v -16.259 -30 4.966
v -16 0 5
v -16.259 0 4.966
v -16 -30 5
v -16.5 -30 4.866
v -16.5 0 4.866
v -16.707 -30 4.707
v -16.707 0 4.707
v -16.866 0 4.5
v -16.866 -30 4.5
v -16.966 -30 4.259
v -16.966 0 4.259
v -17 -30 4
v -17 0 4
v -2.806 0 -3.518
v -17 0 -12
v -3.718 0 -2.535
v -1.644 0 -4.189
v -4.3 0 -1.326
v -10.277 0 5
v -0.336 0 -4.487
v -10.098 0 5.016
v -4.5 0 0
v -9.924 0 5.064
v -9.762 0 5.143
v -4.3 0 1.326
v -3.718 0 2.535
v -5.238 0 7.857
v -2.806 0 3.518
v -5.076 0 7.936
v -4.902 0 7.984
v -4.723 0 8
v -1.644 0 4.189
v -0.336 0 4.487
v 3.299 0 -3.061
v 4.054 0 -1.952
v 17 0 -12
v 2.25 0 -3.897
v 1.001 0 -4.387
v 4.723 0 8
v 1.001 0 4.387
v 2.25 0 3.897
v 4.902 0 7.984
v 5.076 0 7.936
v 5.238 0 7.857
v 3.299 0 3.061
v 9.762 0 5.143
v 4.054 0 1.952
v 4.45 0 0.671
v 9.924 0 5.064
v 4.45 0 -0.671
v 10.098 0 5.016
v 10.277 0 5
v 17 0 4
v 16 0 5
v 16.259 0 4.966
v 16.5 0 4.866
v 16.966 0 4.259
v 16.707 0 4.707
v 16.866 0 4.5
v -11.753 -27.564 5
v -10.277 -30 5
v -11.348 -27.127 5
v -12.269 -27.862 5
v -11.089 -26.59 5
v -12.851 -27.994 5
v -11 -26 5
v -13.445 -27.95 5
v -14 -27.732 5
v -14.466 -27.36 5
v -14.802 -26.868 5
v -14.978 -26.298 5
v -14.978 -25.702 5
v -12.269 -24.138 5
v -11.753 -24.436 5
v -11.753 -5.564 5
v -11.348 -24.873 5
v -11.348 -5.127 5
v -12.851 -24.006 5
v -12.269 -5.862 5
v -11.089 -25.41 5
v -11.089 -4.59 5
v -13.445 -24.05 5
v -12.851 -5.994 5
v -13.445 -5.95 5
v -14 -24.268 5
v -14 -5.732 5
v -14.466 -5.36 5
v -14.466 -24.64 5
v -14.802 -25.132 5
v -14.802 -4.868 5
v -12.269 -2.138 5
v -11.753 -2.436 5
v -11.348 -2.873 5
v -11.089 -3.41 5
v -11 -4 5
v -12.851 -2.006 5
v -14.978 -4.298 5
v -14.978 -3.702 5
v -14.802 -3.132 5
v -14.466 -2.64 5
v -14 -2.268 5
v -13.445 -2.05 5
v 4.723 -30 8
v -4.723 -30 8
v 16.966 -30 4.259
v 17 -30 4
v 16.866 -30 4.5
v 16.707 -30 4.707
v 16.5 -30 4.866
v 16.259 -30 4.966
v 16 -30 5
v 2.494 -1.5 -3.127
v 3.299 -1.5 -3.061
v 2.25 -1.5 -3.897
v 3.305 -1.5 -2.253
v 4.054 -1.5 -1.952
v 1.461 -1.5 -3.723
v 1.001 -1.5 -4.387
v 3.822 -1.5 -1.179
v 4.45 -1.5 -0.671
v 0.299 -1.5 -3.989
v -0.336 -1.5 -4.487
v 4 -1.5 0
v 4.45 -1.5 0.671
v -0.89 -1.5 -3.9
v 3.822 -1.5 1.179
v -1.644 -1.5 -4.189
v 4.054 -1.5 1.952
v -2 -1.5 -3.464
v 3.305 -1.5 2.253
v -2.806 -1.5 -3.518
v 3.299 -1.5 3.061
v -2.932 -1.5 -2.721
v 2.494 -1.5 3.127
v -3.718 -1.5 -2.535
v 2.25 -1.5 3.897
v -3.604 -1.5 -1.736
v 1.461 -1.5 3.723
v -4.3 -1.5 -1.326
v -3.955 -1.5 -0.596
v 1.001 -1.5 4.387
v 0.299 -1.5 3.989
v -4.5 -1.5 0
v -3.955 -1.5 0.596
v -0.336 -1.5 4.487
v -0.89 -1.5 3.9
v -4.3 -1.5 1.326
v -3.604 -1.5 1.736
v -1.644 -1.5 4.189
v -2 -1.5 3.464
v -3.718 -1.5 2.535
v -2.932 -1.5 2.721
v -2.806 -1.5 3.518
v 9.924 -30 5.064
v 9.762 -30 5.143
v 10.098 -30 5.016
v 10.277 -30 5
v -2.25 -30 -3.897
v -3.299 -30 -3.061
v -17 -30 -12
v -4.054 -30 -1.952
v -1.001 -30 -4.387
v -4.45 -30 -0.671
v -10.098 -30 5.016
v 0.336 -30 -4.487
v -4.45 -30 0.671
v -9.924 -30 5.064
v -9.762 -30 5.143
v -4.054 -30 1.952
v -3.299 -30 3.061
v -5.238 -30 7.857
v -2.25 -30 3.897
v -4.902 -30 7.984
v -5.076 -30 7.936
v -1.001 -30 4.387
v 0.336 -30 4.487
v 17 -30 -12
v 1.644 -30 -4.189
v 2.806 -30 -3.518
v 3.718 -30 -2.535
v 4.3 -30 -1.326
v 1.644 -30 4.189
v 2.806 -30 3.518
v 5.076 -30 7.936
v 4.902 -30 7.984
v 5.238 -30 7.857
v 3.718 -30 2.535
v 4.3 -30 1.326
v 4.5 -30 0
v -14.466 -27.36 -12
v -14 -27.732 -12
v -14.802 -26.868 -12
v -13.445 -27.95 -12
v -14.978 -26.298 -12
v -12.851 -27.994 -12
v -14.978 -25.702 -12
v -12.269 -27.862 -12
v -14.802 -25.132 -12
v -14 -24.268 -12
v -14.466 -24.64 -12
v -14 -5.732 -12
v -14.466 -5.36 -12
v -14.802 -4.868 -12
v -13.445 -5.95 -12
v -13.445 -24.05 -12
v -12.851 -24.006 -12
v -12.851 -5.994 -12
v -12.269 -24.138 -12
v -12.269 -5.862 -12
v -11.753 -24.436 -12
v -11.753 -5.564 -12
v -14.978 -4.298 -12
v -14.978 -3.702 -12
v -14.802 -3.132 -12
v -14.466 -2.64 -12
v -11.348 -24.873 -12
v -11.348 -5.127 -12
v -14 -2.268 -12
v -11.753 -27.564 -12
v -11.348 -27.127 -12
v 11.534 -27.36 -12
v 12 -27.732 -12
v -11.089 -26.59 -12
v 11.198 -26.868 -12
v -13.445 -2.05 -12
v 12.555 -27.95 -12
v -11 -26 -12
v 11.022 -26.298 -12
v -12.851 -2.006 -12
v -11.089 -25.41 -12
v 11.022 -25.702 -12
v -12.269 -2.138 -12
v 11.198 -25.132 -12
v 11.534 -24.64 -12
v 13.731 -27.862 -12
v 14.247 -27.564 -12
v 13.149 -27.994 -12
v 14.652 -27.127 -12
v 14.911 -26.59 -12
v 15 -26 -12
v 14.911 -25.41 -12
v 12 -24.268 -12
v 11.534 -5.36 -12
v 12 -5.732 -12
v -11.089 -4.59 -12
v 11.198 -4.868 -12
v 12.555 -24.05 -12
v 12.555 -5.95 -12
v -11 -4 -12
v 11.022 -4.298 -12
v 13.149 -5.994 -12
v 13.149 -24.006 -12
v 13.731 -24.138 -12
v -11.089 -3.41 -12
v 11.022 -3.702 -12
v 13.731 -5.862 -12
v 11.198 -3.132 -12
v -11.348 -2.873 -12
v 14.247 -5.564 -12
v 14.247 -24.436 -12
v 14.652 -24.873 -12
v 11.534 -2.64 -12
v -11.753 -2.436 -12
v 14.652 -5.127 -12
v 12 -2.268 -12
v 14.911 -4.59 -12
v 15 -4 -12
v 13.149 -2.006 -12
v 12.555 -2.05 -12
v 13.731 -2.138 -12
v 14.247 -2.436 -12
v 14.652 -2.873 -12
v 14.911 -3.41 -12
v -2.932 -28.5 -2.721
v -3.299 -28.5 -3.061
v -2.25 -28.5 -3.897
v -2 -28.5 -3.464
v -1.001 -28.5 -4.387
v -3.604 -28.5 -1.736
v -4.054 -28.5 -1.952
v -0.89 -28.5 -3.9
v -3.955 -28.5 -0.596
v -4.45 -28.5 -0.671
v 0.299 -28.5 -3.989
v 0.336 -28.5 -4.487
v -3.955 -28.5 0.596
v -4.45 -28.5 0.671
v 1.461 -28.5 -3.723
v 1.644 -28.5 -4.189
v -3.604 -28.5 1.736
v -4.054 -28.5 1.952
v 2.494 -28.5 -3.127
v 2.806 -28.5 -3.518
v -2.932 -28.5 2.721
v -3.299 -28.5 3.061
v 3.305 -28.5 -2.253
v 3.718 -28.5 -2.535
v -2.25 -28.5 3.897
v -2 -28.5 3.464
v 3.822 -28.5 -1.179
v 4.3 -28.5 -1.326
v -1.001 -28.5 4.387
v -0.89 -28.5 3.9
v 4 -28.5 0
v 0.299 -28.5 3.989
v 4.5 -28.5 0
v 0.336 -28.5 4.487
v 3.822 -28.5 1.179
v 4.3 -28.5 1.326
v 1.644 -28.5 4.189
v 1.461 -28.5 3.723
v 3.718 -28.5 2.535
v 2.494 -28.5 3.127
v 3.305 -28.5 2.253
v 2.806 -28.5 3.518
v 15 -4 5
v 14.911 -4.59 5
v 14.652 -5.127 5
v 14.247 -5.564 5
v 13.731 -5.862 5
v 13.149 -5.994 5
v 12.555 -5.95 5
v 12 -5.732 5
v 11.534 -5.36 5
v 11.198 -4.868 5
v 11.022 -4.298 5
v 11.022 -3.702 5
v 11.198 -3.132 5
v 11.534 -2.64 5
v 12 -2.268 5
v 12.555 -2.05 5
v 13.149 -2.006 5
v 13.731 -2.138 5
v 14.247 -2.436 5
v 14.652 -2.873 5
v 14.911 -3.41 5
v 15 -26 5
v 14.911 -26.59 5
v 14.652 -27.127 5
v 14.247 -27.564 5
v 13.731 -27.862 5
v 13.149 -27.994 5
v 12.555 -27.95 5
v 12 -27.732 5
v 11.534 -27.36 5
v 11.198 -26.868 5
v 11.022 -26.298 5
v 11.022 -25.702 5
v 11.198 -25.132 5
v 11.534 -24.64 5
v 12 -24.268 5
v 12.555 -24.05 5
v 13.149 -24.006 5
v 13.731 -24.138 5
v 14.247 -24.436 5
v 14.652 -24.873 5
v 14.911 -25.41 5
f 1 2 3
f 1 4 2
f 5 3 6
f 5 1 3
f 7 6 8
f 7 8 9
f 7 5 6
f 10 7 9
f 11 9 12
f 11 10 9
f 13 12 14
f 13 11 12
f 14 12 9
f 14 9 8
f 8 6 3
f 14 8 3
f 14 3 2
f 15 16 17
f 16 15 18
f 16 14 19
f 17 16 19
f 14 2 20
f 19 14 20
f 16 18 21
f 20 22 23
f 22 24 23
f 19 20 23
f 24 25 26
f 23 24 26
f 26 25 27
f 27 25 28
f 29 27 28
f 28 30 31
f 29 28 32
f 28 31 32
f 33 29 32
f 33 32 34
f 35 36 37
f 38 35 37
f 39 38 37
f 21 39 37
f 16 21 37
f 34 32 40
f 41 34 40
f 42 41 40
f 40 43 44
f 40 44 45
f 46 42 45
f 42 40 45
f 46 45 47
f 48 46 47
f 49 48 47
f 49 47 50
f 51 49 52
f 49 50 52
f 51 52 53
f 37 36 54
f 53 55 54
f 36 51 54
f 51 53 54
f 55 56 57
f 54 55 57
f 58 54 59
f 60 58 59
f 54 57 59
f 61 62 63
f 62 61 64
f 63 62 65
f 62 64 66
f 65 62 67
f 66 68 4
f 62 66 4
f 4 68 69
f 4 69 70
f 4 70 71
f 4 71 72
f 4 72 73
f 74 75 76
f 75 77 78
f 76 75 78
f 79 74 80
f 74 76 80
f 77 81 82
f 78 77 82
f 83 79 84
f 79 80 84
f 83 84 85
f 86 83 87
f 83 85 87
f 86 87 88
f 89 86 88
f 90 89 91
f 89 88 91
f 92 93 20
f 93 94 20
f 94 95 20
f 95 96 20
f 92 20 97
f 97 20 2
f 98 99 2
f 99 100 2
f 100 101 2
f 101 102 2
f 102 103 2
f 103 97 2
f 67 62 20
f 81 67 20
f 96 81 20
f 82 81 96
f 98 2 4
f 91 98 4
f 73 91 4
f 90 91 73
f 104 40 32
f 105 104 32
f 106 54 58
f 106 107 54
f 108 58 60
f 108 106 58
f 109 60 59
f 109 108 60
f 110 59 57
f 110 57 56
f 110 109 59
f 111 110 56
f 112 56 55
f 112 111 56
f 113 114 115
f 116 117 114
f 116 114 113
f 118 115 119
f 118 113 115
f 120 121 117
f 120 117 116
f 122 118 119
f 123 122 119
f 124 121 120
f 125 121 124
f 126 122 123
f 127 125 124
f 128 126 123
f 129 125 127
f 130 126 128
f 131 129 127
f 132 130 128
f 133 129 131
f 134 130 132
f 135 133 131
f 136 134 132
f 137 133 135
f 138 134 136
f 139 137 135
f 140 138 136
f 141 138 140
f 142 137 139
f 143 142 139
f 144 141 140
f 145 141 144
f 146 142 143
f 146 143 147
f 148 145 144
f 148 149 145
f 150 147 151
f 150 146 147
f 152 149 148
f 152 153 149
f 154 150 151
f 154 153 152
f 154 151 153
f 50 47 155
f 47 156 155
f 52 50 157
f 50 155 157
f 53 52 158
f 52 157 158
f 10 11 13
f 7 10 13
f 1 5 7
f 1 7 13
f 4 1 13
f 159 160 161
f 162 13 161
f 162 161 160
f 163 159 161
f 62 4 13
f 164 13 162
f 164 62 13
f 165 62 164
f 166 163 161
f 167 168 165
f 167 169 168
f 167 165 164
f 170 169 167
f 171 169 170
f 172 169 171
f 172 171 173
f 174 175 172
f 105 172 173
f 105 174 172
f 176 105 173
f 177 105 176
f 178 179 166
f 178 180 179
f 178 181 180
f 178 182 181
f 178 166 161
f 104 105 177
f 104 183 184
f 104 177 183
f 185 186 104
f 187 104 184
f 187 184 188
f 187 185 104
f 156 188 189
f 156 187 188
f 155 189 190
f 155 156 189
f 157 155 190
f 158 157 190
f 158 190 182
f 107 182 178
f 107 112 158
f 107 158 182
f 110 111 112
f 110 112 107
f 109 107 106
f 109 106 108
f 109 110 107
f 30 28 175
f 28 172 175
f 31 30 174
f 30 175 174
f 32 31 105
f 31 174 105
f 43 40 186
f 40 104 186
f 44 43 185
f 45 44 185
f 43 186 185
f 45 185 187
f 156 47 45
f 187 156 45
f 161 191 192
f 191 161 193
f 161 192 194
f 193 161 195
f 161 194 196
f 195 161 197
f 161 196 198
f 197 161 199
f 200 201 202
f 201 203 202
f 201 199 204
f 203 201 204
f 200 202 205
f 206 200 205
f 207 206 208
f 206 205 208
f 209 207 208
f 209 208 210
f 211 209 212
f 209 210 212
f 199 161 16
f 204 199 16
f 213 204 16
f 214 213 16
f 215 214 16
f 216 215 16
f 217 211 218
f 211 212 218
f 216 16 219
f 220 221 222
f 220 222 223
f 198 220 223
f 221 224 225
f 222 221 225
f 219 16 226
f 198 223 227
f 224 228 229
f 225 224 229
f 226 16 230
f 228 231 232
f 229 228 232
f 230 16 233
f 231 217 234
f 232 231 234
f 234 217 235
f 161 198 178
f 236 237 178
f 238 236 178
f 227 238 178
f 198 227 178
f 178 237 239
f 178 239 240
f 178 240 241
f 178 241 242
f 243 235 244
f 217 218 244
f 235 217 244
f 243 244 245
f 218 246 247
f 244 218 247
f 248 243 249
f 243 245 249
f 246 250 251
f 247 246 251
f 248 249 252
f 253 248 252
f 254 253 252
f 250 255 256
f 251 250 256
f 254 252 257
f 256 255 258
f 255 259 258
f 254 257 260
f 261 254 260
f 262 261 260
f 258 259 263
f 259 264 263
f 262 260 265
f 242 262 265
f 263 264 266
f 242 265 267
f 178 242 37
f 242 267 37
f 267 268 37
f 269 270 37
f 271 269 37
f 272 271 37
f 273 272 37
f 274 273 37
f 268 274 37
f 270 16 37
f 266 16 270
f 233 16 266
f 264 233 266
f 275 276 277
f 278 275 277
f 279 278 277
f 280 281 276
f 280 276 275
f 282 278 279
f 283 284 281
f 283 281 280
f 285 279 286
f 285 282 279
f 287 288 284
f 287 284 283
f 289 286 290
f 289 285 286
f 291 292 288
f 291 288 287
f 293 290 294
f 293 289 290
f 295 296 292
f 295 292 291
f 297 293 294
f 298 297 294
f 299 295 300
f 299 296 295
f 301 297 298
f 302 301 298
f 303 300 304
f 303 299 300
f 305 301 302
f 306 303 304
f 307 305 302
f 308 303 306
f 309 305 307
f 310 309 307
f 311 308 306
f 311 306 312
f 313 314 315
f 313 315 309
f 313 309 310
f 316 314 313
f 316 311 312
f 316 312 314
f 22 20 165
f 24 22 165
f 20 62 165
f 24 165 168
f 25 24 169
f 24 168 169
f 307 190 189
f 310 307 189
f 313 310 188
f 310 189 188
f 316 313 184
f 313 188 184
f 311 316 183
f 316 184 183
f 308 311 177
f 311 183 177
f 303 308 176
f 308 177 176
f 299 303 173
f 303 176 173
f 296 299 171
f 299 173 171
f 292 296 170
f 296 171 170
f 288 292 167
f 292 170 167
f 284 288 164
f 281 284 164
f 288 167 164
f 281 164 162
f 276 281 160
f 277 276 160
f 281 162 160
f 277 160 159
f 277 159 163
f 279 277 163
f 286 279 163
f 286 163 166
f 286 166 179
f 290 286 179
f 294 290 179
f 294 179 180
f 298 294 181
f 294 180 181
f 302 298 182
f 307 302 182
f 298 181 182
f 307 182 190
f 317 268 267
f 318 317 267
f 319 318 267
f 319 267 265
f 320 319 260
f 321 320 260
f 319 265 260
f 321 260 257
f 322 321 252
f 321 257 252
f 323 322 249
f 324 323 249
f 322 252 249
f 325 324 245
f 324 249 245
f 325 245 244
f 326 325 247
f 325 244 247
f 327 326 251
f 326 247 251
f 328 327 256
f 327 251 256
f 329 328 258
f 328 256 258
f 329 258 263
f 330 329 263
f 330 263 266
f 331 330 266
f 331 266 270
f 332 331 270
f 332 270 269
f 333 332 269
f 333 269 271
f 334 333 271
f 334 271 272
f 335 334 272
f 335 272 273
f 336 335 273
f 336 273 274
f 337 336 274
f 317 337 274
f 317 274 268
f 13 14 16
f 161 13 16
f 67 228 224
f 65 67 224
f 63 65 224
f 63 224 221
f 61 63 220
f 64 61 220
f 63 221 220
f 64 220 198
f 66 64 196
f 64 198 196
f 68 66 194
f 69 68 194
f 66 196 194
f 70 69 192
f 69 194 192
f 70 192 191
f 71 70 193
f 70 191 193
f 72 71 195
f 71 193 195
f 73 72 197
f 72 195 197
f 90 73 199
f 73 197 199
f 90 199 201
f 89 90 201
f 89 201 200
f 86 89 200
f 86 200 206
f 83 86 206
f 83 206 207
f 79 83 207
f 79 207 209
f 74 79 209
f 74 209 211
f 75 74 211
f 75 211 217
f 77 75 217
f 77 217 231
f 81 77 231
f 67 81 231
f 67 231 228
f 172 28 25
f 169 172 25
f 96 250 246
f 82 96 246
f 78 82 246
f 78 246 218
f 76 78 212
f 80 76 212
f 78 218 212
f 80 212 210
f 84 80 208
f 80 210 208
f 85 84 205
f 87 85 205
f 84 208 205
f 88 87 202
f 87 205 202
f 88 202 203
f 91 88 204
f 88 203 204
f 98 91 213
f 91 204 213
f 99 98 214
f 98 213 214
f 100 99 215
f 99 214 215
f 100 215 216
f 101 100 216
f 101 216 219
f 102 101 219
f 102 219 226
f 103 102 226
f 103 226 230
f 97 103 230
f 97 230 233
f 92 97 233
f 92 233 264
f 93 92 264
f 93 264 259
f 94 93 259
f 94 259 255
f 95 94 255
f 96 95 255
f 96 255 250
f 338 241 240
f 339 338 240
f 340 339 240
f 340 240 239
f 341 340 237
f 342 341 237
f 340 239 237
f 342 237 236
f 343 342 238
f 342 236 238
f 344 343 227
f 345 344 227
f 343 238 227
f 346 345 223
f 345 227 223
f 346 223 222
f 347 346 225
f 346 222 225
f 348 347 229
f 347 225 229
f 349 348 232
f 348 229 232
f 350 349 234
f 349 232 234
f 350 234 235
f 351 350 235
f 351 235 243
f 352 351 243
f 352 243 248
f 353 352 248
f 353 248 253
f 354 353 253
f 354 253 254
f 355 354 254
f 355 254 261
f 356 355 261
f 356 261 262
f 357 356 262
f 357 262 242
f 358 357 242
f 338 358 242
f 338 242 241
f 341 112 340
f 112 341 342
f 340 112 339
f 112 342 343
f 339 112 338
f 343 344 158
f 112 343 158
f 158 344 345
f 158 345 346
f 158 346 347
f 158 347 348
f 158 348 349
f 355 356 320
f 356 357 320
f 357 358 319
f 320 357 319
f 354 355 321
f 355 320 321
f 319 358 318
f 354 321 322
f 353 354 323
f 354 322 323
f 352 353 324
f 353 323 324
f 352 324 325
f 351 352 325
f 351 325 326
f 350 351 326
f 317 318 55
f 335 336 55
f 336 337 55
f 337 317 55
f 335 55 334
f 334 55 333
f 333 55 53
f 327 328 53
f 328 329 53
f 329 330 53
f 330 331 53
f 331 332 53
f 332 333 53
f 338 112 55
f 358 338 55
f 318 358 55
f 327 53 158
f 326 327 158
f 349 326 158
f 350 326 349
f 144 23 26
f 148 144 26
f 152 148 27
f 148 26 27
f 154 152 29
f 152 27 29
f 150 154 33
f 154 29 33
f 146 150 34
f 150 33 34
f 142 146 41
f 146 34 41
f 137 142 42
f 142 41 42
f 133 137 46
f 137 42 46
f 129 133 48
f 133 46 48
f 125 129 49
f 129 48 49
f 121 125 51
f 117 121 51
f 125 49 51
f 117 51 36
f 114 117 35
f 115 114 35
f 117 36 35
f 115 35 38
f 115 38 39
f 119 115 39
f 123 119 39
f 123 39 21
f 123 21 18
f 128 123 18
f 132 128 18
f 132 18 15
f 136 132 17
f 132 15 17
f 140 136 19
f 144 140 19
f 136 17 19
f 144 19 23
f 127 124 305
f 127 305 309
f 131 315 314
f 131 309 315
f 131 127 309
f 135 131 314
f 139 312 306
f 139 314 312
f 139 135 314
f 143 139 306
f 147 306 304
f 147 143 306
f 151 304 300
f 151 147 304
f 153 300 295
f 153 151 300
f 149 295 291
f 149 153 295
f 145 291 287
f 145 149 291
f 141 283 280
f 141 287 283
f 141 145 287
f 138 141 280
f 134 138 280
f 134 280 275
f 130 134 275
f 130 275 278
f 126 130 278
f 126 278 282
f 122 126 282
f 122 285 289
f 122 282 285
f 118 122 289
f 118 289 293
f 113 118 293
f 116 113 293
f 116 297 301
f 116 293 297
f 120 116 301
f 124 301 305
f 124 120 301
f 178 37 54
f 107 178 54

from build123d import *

# Parameters (mm, degrees)
F0_R     = 4
F1_DEPTH = 30
F2_R     = 2
F3_DEPTH = 25
F4_R     = 4.5
F5_DEPTH = 1.5
F6_R     = 4.5
F7_DEPTH = 1.5
F8_R     = 1


with BuildPart() as f1:
    # F0 (on Front) → F1 (new body)
    with BuildSketch(Plane.XZ):
        Polygon((-10, 5), (-17, 5), (-17, -12), (17, -12), (17, 5), (10, 5), (5, 8), (-5, 8), align=None)
        Circle(F0_R, mode=Mode.SUBTRACT)
    extrude(amount=F1_DEPTH)

    # F2 (on face) → F3 (cut)
    with BuildSketch(Plane(origin=(0, 0, -12), x_dir=(1, 0, 0), z_dir=(0, 0, -1))):
        with Locations((-13, 26)):
            Circle(F2_R)
        with Locations((-13, 4)):
            Circle(F2_R)
        with Locations((13, 26)):
            Circle(F2_R)
        with Locations((13, 4)):
            Circle(F2_R)
    extrude(amount=-F3_DEPTH, mode=Mode.SUBTRACT)

    # F4 (on face) → F5 (cut)
    with BuildSketch(Plane.XZ.offset(30)):
        Circle(F4_R)
    extrude(amount=-F5_DEPTH, mode=Mode.SUBTRACT)

    # F6 (on face) → F7 (cut)
    with BuildSketch(Plane(origin=(0, 0, 0), x_dir=(-1, 0, 0), z_dir=(0, 1, 0))):
        Circle(F6_R)
    extrude(amount=-F7_DEPTH, mode=Mode.SUBTRACT)

    # F8
    f8_edges = [f1.edges().sort_by_distance(p)[0] for p in [
        (-17, -15, 5),
        (-10, -15, 5),
        (-5, -15, 8),
        (5, -15, 8),
        (10, -15, 5),
        (17, -15, 5),
    ]]
    fillet(f8_edges, radius=F8_R)


solid = f1.part
